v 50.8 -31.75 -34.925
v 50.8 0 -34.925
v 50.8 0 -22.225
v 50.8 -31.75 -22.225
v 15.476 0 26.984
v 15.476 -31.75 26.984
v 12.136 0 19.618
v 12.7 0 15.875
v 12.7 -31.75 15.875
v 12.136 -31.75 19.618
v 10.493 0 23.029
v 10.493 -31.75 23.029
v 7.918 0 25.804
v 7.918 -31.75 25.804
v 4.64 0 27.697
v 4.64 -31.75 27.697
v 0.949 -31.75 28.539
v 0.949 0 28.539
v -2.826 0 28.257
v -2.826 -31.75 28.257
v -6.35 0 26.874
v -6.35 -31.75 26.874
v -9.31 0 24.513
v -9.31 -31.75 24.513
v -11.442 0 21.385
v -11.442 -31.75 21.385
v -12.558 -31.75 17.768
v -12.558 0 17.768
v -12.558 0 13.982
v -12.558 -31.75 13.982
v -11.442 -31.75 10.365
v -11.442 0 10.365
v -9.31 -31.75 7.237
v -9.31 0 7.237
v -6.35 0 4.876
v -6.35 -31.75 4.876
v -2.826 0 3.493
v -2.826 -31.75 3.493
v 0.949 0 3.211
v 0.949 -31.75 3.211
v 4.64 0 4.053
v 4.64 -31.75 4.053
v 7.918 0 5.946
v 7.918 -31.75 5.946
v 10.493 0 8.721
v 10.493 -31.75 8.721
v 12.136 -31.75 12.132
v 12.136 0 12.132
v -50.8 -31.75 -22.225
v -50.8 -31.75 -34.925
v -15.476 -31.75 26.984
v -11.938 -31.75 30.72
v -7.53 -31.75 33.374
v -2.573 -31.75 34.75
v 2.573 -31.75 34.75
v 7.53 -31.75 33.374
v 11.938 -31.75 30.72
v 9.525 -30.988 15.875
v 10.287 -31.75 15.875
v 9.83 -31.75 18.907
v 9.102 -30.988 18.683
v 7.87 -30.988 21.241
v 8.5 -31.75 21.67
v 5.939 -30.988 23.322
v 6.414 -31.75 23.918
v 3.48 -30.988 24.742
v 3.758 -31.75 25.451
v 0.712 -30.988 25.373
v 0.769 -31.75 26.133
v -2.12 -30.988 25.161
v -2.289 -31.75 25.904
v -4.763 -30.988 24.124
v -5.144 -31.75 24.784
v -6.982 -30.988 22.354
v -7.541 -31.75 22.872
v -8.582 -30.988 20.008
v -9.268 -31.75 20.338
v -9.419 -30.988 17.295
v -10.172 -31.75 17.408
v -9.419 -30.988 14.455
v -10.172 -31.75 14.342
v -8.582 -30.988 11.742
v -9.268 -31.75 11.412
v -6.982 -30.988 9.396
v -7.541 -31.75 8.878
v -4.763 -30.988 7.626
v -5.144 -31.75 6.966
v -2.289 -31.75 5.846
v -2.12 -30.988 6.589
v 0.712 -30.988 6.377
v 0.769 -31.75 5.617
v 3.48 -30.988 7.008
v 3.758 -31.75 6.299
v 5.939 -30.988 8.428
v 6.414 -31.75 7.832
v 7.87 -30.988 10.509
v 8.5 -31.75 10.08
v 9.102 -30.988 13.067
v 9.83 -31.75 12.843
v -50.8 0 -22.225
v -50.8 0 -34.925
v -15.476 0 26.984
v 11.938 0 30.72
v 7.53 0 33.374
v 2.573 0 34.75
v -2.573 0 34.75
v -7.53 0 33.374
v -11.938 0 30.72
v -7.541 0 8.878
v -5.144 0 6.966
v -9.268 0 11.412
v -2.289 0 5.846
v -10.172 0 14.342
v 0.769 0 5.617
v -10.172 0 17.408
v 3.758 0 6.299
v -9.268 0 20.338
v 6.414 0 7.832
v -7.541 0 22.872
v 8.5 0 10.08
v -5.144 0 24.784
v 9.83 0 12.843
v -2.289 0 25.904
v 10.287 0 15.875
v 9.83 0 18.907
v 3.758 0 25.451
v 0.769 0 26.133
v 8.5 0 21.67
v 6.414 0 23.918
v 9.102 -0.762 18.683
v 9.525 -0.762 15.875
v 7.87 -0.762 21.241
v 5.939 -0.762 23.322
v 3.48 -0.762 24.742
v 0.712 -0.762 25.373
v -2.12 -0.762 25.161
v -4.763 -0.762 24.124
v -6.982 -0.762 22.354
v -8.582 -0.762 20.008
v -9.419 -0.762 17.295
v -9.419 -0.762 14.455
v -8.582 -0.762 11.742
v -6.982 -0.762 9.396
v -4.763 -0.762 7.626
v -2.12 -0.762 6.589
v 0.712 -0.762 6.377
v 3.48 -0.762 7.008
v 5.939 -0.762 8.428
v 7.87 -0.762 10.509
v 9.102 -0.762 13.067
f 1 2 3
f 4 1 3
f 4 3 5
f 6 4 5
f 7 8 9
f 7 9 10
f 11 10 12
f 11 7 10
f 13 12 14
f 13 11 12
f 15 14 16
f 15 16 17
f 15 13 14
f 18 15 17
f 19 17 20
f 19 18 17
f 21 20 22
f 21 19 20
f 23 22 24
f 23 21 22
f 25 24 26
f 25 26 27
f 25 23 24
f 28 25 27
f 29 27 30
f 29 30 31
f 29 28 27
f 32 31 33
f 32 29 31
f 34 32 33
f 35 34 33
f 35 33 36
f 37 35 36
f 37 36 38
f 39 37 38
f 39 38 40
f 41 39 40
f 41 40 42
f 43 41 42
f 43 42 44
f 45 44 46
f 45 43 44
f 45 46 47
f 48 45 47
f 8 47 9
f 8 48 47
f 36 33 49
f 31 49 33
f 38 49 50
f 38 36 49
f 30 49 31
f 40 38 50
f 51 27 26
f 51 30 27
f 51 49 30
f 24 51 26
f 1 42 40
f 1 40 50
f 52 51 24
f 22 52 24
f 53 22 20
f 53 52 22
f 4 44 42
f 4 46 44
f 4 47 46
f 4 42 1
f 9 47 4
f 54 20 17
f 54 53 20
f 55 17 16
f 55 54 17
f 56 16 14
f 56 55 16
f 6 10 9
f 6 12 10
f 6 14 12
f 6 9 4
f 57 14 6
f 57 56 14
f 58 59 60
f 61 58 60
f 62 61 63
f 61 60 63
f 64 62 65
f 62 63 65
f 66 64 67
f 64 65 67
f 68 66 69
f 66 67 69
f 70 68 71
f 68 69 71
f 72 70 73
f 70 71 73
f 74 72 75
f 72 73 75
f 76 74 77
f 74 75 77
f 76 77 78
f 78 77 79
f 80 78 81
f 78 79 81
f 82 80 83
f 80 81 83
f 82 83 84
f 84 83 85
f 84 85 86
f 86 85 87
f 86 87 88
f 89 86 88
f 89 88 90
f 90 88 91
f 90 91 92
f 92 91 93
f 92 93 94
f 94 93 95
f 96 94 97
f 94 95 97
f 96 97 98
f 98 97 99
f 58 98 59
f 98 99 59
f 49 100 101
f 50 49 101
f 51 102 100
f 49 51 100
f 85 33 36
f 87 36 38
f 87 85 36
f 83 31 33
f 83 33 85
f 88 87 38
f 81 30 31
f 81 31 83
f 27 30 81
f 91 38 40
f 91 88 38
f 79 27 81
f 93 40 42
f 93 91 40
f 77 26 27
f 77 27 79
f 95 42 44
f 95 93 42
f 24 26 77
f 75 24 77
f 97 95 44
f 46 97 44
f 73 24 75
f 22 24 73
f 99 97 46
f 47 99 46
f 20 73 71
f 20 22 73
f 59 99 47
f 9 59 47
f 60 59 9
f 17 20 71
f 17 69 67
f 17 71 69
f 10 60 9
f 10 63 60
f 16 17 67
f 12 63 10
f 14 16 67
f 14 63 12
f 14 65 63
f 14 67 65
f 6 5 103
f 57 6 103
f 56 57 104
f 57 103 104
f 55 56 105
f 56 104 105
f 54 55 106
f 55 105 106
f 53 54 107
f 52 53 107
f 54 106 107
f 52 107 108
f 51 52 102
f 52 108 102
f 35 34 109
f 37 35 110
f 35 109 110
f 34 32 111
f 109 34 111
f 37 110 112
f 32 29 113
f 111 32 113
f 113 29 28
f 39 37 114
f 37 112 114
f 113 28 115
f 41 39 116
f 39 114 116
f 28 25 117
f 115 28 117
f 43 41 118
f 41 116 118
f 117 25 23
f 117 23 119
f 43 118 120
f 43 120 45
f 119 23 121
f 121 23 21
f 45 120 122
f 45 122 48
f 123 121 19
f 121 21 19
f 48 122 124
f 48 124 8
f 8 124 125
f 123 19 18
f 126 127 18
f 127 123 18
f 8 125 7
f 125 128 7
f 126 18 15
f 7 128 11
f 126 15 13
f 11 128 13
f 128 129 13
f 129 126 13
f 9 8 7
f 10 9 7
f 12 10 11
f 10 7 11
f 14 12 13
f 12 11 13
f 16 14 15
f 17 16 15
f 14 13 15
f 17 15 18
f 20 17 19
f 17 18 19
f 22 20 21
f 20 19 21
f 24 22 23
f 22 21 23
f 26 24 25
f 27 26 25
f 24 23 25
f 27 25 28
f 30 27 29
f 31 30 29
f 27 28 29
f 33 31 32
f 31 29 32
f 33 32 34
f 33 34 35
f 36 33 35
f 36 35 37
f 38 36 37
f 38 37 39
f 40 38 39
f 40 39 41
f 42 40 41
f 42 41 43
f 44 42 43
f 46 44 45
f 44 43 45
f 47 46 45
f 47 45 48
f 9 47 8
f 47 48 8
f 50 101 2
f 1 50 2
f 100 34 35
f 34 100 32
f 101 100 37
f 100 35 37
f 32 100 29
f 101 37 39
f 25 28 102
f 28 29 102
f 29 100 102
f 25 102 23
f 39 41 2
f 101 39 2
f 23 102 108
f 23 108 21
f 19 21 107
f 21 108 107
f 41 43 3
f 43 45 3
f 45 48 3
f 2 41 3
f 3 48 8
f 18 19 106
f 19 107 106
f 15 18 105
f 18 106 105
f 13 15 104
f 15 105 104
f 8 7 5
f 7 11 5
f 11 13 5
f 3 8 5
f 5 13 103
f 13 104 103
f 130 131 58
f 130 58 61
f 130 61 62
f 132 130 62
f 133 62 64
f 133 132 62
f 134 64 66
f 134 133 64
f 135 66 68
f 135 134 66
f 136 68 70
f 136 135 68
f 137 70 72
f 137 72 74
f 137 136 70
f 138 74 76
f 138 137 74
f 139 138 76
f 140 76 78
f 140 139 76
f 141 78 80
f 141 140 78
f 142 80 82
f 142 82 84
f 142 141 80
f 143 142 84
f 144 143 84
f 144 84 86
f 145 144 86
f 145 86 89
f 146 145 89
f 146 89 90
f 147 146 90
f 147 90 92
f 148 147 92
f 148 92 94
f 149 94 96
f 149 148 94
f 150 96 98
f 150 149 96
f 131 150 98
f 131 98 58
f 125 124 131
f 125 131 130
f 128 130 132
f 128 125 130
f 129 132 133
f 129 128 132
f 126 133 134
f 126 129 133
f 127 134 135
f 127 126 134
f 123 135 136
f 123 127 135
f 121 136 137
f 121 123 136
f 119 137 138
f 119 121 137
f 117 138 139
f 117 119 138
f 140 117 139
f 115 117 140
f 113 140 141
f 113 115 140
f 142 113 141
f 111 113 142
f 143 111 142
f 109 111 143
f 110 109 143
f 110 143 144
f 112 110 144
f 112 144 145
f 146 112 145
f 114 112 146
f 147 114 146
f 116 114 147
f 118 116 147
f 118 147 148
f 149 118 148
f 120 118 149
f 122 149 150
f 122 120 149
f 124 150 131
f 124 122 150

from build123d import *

# Parameters (mm, degrees)
F0_R     = 12.7
F1_DEPTH = 31.75
F0_R_2   = 9.525
F2_DEPTH = 31.75
F3_SIZE  = 0.762


with BuildPart() as f1:
    # F0 (on Front) → F1 (new body)
    with BuildSketch(Plane.XZ):
        with BuildLine():
            Line((-50.8, -22.225), (-50.8, -34.925))
            Line((-50.8, -34.925), (50.8, -34.925))
            Line((50.8, -34.925), (50.8, -22.225))
            Line((50.8, -22.225), (15.475525, 26.984033))
            ThreePointArc((15.475525, 26.984033), (0, 34.925), (-15.475525, 26.984033))
            Line((-15.475525, 26.984033), (-50.8, -22.225))
        make_face()
        with Locations((0, 15.875)):
            Circle(F0_R, mode=Mode.SUBTRACT)
    extrude(amount=F1_DEPTH)


with BuildPart() as f2:
    # F0 (on Front) → F2 (new body)
    with BuildSketch(Plane.XZ):
        with Locations((0, 15.875)):
            Circle(F0_R)
        with Locations((0, 15.875)):
            Circle(F0_R_2, mode=Mode.SUBTRACT)
    extrude(amount=F2_DEPTH)

    # F3
    f3_edges = [f2.edges().sort_by_distance(p)[0] for p in [
        (-9.525, -31.75, 15.875),
        (-9.525, 0, 15.875),
    ]]
    chamfer(f3_edges, length=F3_SIZE)


solid = Compound([f1.part, f2.part])
